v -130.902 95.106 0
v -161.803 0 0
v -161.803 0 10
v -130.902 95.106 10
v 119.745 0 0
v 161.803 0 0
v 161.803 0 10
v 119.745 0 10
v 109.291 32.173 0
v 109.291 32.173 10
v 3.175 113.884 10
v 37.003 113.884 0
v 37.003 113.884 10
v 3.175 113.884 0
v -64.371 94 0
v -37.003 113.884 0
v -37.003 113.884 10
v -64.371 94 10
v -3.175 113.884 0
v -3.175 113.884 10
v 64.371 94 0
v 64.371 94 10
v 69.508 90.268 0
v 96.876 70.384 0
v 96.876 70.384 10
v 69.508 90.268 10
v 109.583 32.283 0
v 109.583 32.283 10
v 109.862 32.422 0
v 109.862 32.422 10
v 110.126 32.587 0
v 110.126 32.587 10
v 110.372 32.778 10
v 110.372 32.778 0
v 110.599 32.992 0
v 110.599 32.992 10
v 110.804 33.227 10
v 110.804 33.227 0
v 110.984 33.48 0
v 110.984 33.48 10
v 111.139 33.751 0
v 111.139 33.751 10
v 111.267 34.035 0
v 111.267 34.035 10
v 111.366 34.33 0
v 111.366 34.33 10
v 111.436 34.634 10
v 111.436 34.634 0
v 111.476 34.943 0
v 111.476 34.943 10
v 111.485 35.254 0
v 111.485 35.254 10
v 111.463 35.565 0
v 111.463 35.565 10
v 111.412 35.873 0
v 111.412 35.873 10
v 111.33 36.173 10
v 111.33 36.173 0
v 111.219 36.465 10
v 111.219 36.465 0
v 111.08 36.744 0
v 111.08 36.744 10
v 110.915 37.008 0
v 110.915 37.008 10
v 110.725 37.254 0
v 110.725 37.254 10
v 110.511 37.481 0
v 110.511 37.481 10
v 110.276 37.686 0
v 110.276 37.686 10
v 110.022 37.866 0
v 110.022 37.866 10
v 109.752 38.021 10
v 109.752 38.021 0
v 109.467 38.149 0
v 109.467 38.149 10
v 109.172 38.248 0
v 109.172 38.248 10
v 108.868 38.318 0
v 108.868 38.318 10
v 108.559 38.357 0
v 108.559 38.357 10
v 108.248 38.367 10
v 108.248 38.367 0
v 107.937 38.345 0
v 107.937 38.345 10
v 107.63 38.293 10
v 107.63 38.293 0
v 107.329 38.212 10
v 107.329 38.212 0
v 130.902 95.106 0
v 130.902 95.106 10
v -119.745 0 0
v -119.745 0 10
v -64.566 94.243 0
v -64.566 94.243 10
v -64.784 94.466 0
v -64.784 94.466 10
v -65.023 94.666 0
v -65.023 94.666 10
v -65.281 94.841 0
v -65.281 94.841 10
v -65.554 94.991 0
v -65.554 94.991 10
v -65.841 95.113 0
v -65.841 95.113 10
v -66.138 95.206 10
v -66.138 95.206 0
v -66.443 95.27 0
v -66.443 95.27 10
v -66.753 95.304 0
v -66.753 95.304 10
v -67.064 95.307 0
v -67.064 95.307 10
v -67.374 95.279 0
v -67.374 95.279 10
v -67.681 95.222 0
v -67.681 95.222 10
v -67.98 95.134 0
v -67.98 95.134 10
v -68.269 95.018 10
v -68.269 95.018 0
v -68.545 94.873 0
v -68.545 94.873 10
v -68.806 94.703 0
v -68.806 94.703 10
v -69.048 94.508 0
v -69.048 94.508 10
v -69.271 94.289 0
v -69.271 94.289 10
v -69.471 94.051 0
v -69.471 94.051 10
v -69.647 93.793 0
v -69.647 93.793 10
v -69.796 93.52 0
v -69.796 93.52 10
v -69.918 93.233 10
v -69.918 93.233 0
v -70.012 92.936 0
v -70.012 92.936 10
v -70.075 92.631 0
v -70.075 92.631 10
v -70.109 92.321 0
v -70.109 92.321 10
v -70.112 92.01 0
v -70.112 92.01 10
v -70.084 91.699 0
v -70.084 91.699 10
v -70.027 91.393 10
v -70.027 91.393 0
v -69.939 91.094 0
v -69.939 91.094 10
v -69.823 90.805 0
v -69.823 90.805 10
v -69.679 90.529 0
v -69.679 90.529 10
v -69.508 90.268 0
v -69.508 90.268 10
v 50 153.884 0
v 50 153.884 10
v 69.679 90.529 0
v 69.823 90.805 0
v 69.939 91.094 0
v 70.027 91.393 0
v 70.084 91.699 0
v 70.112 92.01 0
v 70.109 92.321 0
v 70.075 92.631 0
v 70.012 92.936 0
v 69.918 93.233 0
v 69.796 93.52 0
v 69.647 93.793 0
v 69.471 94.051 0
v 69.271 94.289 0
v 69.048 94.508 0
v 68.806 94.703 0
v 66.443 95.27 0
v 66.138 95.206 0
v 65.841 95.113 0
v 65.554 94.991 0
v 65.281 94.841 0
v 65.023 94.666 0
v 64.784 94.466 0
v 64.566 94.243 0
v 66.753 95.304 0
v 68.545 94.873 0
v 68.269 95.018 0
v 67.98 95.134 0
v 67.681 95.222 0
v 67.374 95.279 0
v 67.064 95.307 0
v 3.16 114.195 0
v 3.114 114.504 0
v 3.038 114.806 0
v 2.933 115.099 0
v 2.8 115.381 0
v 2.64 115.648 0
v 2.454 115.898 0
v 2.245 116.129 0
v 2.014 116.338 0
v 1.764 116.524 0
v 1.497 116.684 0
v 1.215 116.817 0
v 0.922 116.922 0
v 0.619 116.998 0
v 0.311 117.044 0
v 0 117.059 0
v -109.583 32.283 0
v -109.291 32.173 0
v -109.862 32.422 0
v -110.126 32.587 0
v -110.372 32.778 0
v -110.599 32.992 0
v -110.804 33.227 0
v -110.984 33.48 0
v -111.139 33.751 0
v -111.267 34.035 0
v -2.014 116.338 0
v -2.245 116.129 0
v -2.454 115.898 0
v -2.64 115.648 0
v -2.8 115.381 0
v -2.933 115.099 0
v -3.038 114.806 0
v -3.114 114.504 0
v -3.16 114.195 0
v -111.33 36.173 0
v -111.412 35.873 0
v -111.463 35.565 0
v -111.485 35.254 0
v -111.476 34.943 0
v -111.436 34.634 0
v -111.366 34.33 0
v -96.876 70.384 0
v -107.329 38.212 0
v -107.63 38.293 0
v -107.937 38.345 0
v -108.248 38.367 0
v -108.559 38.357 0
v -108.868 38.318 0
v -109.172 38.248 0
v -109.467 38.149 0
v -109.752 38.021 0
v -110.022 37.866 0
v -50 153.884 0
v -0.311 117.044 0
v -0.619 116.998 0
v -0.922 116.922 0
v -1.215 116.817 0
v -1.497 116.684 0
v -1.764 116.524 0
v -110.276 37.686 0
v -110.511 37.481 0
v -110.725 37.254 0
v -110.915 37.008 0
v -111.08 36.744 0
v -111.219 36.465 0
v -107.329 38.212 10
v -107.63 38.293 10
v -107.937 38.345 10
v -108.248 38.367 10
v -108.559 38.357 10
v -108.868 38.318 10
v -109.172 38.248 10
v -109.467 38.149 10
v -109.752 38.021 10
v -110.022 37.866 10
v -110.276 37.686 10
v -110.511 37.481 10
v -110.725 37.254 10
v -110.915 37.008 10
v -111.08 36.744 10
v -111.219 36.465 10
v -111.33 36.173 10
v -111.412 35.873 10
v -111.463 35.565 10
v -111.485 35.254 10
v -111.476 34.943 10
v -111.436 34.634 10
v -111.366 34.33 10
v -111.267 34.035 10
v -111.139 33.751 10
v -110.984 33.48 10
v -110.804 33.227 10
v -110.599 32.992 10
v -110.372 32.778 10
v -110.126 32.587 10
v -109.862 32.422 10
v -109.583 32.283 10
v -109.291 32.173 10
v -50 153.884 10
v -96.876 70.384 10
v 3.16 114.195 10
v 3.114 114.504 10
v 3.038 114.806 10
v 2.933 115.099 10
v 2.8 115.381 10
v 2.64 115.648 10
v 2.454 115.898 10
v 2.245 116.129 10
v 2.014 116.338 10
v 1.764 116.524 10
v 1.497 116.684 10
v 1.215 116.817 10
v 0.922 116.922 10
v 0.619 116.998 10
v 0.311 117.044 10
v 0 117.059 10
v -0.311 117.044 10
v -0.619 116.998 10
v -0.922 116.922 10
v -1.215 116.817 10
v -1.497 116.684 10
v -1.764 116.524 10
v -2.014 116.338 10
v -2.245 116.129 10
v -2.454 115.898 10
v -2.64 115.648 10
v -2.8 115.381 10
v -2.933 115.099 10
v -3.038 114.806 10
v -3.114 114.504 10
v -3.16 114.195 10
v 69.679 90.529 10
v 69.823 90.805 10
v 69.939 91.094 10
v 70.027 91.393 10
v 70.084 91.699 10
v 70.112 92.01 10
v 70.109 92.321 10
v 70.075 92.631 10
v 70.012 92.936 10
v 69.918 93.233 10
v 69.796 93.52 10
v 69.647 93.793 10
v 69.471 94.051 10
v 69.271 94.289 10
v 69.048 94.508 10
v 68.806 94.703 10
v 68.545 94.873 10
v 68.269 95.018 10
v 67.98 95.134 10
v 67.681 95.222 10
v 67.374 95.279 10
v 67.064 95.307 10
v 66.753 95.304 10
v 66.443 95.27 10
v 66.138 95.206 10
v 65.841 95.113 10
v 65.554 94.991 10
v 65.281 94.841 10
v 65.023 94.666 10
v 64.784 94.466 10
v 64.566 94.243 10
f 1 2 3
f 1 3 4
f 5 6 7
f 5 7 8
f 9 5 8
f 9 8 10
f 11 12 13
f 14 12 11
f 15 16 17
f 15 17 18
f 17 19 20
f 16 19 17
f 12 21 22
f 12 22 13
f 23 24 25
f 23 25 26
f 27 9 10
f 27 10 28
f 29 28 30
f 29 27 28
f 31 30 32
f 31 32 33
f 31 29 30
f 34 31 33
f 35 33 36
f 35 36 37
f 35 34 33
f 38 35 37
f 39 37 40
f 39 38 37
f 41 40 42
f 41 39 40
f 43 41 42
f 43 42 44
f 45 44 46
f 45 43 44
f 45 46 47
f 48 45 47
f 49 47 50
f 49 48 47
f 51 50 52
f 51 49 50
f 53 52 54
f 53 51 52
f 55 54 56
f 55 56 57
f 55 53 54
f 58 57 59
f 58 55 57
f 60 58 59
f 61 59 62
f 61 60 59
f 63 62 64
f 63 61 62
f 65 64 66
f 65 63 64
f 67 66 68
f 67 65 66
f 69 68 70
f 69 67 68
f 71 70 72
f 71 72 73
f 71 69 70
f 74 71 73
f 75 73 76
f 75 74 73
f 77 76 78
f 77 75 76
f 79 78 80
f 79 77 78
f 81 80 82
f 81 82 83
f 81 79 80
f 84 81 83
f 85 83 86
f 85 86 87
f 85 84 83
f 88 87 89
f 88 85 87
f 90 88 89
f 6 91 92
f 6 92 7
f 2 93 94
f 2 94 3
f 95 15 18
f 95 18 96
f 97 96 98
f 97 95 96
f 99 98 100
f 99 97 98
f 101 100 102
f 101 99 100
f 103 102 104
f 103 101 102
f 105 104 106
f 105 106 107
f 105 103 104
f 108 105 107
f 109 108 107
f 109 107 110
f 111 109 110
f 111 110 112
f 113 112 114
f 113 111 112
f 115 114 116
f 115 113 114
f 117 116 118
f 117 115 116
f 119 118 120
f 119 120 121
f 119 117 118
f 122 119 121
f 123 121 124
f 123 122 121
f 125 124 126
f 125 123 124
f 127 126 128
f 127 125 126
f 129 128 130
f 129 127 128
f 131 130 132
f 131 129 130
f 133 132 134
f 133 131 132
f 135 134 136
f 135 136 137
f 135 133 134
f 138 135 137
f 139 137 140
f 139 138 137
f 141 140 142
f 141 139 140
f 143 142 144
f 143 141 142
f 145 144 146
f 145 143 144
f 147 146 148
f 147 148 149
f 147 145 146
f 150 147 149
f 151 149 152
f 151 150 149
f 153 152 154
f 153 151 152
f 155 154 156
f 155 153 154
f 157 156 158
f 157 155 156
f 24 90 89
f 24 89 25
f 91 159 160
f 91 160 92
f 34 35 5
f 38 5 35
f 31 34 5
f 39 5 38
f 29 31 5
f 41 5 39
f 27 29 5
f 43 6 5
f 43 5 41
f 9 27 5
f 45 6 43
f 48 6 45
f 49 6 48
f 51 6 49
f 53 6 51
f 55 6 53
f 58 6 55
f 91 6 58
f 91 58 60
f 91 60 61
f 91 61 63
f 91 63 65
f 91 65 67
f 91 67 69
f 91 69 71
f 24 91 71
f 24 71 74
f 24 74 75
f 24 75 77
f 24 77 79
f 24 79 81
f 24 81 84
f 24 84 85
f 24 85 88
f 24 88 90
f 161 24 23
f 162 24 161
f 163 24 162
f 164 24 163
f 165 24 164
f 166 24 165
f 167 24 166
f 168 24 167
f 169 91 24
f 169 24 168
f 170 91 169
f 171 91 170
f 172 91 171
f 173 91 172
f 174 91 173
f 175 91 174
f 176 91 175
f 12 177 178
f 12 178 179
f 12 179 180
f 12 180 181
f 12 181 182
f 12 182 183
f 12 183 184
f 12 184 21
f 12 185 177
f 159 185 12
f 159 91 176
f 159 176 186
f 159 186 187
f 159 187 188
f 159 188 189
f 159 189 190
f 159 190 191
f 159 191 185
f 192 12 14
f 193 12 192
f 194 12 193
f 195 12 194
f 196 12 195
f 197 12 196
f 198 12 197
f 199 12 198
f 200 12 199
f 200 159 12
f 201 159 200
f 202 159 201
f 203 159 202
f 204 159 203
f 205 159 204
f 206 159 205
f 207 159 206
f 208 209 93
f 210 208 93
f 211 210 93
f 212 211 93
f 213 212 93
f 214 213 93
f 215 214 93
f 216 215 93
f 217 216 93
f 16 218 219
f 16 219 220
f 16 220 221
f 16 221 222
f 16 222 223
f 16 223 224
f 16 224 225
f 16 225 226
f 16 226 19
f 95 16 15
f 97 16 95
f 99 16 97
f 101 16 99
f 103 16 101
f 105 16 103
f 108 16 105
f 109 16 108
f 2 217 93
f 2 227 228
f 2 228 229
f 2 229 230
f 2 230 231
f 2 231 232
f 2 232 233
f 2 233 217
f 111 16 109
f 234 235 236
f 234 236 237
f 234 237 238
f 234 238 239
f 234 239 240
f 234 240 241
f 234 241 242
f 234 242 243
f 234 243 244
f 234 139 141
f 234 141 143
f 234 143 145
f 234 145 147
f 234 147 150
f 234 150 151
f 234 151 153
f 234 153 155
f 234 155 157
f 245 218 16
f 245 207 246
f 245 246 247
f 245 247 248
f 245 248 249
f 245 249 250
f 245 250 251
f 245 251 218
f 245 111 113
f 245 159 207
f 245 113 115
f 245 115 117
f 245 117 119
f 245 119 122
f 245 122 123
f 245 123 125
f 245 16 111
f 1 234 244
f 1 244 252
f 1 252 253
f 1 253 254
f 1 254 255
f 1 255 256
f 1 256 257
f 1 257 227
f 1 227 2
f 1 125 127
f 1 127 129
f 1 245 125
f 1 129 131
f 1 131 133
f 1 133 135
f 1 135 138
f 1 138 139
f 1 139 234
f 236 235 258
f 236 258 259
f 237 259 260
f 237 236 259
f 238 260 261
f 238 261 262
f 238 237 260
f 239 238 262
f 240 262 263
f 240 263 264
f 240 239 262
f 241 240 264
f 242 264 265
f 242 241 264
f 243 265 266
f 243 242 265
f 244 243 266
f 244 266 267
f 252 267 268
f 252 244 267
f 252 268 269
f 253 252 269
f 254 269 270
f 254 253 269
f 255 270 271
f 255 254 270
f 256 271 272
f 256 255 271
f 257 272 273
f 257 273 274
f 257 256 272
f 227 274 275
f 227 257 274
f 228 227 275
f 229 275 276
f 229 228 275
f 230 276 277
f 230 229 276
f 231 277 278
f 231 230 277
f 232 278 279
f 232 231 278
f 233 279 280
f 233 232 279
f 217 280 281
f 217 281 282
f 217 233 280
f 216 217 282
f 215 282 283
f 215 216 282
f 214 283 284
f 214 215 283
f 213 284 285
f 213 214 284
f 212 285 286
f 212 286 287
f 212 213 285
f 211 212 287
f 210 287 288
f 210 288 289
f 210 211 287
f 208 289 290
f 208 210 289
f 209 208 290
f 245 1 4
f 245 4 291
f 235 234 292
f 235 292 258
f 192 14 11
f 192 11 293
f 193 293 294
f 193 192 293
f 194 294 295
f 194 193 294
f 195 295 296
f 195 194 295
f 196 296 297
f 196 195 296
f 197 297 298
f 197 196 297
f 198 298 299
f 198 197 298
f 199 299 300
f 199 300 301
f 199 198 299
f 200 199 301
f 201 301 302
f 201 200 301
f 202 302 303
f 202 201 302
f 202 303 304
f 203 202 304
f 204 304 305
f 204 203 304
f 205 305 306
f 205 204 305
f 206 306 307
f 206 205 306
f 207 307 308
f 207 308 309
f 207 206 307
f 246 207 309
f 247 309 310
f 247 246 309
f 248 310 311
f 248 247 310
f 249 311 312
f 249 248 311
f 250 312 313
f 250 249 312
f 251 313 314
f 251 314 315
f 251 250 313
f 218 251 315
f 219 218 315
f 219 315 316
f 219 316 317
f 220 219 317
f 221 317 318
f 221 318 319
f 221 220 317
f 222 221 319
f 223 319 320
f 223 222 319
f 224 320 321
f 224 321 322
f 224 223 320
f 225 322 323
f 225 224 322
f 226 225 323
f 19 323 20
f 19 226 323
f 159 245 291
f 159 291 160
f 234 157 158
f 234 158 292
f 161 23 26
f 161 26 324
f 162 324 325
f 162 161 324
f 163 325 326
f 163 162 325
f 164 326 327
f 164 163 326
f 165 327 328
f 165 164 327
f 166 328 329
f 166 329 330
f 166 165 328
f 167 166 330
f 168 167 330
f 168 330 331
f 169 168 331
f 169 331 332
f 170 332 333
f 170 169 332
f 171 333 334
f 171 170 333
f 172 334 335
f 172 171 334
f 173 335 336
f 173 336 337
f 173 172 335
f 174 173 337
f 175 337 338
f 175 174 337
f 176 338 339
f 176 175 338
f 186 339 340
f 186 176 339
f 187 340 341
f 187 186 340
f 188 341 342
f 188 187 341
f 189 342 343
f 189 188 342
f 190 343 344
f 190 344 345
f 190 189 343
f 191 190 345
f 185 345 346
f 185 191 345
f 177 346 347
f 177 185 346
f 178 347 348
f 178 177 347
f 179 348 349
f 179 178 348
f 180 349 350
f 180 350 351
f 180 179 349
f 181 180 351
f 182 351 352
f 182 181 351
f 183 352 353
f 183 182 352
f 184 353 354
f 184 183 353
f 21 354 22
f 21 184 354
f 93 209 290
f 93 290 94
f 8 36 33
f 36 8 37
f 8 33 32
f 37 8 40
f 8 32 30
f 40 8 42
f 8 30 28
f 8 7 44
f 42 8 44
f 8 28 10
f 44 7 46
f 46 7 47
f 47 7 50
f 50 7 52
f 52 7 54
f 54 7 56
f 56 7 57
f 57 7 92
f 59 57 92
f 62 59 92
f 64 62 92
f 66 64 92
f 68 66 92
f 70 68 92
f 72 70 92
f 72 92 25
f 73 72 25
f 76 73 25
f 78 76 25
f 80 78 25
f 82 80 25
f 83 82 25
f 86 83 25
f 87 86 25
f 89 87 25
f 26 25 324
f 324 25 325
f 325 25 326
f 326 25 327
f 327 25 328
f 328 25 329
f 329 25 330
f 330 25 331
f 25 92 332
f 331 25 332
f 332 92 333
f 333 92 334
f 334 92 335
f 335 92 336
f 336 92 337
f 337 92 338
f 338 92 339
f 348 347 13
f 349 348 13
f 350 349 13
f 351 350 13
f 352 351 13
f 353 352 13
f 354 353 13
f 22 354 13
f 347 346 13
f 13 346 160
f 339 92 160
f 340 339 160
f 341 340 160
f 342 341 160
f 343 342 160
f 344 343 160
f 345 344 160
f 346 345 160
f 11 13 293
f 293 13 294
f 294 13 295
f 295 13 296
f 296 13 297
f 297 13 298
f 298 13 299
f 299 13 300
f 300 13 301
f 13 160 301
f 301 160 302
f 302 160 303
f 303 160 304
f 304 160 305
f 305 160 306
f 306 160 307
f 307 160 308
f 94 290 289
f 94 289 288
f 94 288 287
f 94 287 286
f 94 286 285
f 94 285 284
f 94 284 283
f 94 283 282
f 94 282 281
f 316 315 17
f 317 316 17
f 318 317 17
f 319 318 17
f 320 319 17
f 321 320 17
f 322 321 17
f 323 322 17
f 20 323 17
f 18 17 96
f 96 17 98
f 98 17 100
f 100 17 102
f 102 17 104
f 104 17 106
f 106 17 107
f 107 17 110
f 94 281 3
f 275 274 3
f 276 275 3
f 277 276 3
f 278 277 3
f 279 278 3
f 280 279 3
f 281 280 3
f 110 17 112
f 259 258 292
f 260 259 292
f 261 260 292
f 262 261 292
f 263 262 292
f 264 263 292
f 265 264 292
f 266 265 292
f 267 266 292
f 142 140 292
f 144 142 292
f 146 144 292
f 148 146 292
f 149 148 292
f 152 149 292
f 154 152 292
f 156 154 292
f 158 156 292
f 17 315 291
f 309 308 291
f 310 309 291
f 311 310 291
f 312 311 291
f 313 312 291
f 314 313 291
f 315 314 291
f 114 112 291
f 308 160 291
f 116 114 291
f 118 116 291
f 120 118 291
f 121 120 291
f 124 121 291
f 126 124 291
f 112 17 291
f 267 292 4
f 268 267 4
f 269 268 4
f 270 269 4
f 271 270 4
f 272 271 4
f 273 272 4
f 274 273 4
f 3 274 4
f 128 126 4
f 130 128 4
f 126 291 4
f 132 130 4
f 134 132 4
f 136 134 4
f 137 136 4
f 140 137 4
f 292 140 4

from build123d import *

# Parameters (mm, degrees)
BOSS_EXTRUDE1_DEPTH = 10


with BuildPart() as part:
    # Sketch1 → Boss-Extrude1 (new body)
    with BuildSketch(Plane.XY):
        with BuildLine():
            Line((-96.875667103, 70.38429208), (-107.329159547, 38.211750479))
            ThreePointArc((-107.329159547, 38.211750479), (-111.329892944, 36.173274997), (-109.291417462, 32.172541601))
            Line((-109.291417462, 32.172541601), (-119.744909905, 0))
            Line((-119.744909905, 0), (-161.803398875, 0))
            Line((-161.803398875, 0), (-130.901699437, 95.10565163))
            Line((-130.901699437, 95.10565163), (-50, 153.884176859))
            Line((-50, 153.884176859), (50, 153.884176859))
            Line((50, 153.884176859), (130.901699437, 95.10565163))
            Line((130.901699437, 95.10565163), (161.803398875, 0))
            Line((161.803398875, 0), (119.744909905, 0))
            Line((119.744909905, 0), (109.291417462, 32.172541601))
            ThreePointArc((109.291417462, 32.172541601), (111.329892944, 36.173274997), (107.329159547, 38.211750479))
            Line((107.329159547, 38.211750479), (96.875667103, 70.38429208))
            Line((96.875667103, 70.38429208), (69.508068584, 90.268016293))
            ThreePointArc((69.508068584, 90.268016293), (68.805657803, 94.702863426), (64.37081067, 94.000452645))
            Line((64.37081067, 94.000452645), (37.003212151, 113.884176859))
            Line((37.003212151, 113.884176859), (3.175, 113.884176859))
            ThreePointArc((3.175, 113.884176859), (0, 117.059176859), (-3.175, 113.884176859))
            Line((-3.175, 113.884176859), (-37.003212151, 113.884176859))
            Line((-37.003212151, 113.884176859), (-64.37081067, 94.000452645))
            ThreePointArc((-64.37081067, 94.000452645), (-68.805657803, 94.702863426), (-69.508068584, 90.268016293))
            Line((-69.508068584, 90.268016293), (-96.875667103, 70.38429208))
        make_face()
    extrude(amount=BOSS_EXTRUDE1_DEPTH)


solid = part.part
